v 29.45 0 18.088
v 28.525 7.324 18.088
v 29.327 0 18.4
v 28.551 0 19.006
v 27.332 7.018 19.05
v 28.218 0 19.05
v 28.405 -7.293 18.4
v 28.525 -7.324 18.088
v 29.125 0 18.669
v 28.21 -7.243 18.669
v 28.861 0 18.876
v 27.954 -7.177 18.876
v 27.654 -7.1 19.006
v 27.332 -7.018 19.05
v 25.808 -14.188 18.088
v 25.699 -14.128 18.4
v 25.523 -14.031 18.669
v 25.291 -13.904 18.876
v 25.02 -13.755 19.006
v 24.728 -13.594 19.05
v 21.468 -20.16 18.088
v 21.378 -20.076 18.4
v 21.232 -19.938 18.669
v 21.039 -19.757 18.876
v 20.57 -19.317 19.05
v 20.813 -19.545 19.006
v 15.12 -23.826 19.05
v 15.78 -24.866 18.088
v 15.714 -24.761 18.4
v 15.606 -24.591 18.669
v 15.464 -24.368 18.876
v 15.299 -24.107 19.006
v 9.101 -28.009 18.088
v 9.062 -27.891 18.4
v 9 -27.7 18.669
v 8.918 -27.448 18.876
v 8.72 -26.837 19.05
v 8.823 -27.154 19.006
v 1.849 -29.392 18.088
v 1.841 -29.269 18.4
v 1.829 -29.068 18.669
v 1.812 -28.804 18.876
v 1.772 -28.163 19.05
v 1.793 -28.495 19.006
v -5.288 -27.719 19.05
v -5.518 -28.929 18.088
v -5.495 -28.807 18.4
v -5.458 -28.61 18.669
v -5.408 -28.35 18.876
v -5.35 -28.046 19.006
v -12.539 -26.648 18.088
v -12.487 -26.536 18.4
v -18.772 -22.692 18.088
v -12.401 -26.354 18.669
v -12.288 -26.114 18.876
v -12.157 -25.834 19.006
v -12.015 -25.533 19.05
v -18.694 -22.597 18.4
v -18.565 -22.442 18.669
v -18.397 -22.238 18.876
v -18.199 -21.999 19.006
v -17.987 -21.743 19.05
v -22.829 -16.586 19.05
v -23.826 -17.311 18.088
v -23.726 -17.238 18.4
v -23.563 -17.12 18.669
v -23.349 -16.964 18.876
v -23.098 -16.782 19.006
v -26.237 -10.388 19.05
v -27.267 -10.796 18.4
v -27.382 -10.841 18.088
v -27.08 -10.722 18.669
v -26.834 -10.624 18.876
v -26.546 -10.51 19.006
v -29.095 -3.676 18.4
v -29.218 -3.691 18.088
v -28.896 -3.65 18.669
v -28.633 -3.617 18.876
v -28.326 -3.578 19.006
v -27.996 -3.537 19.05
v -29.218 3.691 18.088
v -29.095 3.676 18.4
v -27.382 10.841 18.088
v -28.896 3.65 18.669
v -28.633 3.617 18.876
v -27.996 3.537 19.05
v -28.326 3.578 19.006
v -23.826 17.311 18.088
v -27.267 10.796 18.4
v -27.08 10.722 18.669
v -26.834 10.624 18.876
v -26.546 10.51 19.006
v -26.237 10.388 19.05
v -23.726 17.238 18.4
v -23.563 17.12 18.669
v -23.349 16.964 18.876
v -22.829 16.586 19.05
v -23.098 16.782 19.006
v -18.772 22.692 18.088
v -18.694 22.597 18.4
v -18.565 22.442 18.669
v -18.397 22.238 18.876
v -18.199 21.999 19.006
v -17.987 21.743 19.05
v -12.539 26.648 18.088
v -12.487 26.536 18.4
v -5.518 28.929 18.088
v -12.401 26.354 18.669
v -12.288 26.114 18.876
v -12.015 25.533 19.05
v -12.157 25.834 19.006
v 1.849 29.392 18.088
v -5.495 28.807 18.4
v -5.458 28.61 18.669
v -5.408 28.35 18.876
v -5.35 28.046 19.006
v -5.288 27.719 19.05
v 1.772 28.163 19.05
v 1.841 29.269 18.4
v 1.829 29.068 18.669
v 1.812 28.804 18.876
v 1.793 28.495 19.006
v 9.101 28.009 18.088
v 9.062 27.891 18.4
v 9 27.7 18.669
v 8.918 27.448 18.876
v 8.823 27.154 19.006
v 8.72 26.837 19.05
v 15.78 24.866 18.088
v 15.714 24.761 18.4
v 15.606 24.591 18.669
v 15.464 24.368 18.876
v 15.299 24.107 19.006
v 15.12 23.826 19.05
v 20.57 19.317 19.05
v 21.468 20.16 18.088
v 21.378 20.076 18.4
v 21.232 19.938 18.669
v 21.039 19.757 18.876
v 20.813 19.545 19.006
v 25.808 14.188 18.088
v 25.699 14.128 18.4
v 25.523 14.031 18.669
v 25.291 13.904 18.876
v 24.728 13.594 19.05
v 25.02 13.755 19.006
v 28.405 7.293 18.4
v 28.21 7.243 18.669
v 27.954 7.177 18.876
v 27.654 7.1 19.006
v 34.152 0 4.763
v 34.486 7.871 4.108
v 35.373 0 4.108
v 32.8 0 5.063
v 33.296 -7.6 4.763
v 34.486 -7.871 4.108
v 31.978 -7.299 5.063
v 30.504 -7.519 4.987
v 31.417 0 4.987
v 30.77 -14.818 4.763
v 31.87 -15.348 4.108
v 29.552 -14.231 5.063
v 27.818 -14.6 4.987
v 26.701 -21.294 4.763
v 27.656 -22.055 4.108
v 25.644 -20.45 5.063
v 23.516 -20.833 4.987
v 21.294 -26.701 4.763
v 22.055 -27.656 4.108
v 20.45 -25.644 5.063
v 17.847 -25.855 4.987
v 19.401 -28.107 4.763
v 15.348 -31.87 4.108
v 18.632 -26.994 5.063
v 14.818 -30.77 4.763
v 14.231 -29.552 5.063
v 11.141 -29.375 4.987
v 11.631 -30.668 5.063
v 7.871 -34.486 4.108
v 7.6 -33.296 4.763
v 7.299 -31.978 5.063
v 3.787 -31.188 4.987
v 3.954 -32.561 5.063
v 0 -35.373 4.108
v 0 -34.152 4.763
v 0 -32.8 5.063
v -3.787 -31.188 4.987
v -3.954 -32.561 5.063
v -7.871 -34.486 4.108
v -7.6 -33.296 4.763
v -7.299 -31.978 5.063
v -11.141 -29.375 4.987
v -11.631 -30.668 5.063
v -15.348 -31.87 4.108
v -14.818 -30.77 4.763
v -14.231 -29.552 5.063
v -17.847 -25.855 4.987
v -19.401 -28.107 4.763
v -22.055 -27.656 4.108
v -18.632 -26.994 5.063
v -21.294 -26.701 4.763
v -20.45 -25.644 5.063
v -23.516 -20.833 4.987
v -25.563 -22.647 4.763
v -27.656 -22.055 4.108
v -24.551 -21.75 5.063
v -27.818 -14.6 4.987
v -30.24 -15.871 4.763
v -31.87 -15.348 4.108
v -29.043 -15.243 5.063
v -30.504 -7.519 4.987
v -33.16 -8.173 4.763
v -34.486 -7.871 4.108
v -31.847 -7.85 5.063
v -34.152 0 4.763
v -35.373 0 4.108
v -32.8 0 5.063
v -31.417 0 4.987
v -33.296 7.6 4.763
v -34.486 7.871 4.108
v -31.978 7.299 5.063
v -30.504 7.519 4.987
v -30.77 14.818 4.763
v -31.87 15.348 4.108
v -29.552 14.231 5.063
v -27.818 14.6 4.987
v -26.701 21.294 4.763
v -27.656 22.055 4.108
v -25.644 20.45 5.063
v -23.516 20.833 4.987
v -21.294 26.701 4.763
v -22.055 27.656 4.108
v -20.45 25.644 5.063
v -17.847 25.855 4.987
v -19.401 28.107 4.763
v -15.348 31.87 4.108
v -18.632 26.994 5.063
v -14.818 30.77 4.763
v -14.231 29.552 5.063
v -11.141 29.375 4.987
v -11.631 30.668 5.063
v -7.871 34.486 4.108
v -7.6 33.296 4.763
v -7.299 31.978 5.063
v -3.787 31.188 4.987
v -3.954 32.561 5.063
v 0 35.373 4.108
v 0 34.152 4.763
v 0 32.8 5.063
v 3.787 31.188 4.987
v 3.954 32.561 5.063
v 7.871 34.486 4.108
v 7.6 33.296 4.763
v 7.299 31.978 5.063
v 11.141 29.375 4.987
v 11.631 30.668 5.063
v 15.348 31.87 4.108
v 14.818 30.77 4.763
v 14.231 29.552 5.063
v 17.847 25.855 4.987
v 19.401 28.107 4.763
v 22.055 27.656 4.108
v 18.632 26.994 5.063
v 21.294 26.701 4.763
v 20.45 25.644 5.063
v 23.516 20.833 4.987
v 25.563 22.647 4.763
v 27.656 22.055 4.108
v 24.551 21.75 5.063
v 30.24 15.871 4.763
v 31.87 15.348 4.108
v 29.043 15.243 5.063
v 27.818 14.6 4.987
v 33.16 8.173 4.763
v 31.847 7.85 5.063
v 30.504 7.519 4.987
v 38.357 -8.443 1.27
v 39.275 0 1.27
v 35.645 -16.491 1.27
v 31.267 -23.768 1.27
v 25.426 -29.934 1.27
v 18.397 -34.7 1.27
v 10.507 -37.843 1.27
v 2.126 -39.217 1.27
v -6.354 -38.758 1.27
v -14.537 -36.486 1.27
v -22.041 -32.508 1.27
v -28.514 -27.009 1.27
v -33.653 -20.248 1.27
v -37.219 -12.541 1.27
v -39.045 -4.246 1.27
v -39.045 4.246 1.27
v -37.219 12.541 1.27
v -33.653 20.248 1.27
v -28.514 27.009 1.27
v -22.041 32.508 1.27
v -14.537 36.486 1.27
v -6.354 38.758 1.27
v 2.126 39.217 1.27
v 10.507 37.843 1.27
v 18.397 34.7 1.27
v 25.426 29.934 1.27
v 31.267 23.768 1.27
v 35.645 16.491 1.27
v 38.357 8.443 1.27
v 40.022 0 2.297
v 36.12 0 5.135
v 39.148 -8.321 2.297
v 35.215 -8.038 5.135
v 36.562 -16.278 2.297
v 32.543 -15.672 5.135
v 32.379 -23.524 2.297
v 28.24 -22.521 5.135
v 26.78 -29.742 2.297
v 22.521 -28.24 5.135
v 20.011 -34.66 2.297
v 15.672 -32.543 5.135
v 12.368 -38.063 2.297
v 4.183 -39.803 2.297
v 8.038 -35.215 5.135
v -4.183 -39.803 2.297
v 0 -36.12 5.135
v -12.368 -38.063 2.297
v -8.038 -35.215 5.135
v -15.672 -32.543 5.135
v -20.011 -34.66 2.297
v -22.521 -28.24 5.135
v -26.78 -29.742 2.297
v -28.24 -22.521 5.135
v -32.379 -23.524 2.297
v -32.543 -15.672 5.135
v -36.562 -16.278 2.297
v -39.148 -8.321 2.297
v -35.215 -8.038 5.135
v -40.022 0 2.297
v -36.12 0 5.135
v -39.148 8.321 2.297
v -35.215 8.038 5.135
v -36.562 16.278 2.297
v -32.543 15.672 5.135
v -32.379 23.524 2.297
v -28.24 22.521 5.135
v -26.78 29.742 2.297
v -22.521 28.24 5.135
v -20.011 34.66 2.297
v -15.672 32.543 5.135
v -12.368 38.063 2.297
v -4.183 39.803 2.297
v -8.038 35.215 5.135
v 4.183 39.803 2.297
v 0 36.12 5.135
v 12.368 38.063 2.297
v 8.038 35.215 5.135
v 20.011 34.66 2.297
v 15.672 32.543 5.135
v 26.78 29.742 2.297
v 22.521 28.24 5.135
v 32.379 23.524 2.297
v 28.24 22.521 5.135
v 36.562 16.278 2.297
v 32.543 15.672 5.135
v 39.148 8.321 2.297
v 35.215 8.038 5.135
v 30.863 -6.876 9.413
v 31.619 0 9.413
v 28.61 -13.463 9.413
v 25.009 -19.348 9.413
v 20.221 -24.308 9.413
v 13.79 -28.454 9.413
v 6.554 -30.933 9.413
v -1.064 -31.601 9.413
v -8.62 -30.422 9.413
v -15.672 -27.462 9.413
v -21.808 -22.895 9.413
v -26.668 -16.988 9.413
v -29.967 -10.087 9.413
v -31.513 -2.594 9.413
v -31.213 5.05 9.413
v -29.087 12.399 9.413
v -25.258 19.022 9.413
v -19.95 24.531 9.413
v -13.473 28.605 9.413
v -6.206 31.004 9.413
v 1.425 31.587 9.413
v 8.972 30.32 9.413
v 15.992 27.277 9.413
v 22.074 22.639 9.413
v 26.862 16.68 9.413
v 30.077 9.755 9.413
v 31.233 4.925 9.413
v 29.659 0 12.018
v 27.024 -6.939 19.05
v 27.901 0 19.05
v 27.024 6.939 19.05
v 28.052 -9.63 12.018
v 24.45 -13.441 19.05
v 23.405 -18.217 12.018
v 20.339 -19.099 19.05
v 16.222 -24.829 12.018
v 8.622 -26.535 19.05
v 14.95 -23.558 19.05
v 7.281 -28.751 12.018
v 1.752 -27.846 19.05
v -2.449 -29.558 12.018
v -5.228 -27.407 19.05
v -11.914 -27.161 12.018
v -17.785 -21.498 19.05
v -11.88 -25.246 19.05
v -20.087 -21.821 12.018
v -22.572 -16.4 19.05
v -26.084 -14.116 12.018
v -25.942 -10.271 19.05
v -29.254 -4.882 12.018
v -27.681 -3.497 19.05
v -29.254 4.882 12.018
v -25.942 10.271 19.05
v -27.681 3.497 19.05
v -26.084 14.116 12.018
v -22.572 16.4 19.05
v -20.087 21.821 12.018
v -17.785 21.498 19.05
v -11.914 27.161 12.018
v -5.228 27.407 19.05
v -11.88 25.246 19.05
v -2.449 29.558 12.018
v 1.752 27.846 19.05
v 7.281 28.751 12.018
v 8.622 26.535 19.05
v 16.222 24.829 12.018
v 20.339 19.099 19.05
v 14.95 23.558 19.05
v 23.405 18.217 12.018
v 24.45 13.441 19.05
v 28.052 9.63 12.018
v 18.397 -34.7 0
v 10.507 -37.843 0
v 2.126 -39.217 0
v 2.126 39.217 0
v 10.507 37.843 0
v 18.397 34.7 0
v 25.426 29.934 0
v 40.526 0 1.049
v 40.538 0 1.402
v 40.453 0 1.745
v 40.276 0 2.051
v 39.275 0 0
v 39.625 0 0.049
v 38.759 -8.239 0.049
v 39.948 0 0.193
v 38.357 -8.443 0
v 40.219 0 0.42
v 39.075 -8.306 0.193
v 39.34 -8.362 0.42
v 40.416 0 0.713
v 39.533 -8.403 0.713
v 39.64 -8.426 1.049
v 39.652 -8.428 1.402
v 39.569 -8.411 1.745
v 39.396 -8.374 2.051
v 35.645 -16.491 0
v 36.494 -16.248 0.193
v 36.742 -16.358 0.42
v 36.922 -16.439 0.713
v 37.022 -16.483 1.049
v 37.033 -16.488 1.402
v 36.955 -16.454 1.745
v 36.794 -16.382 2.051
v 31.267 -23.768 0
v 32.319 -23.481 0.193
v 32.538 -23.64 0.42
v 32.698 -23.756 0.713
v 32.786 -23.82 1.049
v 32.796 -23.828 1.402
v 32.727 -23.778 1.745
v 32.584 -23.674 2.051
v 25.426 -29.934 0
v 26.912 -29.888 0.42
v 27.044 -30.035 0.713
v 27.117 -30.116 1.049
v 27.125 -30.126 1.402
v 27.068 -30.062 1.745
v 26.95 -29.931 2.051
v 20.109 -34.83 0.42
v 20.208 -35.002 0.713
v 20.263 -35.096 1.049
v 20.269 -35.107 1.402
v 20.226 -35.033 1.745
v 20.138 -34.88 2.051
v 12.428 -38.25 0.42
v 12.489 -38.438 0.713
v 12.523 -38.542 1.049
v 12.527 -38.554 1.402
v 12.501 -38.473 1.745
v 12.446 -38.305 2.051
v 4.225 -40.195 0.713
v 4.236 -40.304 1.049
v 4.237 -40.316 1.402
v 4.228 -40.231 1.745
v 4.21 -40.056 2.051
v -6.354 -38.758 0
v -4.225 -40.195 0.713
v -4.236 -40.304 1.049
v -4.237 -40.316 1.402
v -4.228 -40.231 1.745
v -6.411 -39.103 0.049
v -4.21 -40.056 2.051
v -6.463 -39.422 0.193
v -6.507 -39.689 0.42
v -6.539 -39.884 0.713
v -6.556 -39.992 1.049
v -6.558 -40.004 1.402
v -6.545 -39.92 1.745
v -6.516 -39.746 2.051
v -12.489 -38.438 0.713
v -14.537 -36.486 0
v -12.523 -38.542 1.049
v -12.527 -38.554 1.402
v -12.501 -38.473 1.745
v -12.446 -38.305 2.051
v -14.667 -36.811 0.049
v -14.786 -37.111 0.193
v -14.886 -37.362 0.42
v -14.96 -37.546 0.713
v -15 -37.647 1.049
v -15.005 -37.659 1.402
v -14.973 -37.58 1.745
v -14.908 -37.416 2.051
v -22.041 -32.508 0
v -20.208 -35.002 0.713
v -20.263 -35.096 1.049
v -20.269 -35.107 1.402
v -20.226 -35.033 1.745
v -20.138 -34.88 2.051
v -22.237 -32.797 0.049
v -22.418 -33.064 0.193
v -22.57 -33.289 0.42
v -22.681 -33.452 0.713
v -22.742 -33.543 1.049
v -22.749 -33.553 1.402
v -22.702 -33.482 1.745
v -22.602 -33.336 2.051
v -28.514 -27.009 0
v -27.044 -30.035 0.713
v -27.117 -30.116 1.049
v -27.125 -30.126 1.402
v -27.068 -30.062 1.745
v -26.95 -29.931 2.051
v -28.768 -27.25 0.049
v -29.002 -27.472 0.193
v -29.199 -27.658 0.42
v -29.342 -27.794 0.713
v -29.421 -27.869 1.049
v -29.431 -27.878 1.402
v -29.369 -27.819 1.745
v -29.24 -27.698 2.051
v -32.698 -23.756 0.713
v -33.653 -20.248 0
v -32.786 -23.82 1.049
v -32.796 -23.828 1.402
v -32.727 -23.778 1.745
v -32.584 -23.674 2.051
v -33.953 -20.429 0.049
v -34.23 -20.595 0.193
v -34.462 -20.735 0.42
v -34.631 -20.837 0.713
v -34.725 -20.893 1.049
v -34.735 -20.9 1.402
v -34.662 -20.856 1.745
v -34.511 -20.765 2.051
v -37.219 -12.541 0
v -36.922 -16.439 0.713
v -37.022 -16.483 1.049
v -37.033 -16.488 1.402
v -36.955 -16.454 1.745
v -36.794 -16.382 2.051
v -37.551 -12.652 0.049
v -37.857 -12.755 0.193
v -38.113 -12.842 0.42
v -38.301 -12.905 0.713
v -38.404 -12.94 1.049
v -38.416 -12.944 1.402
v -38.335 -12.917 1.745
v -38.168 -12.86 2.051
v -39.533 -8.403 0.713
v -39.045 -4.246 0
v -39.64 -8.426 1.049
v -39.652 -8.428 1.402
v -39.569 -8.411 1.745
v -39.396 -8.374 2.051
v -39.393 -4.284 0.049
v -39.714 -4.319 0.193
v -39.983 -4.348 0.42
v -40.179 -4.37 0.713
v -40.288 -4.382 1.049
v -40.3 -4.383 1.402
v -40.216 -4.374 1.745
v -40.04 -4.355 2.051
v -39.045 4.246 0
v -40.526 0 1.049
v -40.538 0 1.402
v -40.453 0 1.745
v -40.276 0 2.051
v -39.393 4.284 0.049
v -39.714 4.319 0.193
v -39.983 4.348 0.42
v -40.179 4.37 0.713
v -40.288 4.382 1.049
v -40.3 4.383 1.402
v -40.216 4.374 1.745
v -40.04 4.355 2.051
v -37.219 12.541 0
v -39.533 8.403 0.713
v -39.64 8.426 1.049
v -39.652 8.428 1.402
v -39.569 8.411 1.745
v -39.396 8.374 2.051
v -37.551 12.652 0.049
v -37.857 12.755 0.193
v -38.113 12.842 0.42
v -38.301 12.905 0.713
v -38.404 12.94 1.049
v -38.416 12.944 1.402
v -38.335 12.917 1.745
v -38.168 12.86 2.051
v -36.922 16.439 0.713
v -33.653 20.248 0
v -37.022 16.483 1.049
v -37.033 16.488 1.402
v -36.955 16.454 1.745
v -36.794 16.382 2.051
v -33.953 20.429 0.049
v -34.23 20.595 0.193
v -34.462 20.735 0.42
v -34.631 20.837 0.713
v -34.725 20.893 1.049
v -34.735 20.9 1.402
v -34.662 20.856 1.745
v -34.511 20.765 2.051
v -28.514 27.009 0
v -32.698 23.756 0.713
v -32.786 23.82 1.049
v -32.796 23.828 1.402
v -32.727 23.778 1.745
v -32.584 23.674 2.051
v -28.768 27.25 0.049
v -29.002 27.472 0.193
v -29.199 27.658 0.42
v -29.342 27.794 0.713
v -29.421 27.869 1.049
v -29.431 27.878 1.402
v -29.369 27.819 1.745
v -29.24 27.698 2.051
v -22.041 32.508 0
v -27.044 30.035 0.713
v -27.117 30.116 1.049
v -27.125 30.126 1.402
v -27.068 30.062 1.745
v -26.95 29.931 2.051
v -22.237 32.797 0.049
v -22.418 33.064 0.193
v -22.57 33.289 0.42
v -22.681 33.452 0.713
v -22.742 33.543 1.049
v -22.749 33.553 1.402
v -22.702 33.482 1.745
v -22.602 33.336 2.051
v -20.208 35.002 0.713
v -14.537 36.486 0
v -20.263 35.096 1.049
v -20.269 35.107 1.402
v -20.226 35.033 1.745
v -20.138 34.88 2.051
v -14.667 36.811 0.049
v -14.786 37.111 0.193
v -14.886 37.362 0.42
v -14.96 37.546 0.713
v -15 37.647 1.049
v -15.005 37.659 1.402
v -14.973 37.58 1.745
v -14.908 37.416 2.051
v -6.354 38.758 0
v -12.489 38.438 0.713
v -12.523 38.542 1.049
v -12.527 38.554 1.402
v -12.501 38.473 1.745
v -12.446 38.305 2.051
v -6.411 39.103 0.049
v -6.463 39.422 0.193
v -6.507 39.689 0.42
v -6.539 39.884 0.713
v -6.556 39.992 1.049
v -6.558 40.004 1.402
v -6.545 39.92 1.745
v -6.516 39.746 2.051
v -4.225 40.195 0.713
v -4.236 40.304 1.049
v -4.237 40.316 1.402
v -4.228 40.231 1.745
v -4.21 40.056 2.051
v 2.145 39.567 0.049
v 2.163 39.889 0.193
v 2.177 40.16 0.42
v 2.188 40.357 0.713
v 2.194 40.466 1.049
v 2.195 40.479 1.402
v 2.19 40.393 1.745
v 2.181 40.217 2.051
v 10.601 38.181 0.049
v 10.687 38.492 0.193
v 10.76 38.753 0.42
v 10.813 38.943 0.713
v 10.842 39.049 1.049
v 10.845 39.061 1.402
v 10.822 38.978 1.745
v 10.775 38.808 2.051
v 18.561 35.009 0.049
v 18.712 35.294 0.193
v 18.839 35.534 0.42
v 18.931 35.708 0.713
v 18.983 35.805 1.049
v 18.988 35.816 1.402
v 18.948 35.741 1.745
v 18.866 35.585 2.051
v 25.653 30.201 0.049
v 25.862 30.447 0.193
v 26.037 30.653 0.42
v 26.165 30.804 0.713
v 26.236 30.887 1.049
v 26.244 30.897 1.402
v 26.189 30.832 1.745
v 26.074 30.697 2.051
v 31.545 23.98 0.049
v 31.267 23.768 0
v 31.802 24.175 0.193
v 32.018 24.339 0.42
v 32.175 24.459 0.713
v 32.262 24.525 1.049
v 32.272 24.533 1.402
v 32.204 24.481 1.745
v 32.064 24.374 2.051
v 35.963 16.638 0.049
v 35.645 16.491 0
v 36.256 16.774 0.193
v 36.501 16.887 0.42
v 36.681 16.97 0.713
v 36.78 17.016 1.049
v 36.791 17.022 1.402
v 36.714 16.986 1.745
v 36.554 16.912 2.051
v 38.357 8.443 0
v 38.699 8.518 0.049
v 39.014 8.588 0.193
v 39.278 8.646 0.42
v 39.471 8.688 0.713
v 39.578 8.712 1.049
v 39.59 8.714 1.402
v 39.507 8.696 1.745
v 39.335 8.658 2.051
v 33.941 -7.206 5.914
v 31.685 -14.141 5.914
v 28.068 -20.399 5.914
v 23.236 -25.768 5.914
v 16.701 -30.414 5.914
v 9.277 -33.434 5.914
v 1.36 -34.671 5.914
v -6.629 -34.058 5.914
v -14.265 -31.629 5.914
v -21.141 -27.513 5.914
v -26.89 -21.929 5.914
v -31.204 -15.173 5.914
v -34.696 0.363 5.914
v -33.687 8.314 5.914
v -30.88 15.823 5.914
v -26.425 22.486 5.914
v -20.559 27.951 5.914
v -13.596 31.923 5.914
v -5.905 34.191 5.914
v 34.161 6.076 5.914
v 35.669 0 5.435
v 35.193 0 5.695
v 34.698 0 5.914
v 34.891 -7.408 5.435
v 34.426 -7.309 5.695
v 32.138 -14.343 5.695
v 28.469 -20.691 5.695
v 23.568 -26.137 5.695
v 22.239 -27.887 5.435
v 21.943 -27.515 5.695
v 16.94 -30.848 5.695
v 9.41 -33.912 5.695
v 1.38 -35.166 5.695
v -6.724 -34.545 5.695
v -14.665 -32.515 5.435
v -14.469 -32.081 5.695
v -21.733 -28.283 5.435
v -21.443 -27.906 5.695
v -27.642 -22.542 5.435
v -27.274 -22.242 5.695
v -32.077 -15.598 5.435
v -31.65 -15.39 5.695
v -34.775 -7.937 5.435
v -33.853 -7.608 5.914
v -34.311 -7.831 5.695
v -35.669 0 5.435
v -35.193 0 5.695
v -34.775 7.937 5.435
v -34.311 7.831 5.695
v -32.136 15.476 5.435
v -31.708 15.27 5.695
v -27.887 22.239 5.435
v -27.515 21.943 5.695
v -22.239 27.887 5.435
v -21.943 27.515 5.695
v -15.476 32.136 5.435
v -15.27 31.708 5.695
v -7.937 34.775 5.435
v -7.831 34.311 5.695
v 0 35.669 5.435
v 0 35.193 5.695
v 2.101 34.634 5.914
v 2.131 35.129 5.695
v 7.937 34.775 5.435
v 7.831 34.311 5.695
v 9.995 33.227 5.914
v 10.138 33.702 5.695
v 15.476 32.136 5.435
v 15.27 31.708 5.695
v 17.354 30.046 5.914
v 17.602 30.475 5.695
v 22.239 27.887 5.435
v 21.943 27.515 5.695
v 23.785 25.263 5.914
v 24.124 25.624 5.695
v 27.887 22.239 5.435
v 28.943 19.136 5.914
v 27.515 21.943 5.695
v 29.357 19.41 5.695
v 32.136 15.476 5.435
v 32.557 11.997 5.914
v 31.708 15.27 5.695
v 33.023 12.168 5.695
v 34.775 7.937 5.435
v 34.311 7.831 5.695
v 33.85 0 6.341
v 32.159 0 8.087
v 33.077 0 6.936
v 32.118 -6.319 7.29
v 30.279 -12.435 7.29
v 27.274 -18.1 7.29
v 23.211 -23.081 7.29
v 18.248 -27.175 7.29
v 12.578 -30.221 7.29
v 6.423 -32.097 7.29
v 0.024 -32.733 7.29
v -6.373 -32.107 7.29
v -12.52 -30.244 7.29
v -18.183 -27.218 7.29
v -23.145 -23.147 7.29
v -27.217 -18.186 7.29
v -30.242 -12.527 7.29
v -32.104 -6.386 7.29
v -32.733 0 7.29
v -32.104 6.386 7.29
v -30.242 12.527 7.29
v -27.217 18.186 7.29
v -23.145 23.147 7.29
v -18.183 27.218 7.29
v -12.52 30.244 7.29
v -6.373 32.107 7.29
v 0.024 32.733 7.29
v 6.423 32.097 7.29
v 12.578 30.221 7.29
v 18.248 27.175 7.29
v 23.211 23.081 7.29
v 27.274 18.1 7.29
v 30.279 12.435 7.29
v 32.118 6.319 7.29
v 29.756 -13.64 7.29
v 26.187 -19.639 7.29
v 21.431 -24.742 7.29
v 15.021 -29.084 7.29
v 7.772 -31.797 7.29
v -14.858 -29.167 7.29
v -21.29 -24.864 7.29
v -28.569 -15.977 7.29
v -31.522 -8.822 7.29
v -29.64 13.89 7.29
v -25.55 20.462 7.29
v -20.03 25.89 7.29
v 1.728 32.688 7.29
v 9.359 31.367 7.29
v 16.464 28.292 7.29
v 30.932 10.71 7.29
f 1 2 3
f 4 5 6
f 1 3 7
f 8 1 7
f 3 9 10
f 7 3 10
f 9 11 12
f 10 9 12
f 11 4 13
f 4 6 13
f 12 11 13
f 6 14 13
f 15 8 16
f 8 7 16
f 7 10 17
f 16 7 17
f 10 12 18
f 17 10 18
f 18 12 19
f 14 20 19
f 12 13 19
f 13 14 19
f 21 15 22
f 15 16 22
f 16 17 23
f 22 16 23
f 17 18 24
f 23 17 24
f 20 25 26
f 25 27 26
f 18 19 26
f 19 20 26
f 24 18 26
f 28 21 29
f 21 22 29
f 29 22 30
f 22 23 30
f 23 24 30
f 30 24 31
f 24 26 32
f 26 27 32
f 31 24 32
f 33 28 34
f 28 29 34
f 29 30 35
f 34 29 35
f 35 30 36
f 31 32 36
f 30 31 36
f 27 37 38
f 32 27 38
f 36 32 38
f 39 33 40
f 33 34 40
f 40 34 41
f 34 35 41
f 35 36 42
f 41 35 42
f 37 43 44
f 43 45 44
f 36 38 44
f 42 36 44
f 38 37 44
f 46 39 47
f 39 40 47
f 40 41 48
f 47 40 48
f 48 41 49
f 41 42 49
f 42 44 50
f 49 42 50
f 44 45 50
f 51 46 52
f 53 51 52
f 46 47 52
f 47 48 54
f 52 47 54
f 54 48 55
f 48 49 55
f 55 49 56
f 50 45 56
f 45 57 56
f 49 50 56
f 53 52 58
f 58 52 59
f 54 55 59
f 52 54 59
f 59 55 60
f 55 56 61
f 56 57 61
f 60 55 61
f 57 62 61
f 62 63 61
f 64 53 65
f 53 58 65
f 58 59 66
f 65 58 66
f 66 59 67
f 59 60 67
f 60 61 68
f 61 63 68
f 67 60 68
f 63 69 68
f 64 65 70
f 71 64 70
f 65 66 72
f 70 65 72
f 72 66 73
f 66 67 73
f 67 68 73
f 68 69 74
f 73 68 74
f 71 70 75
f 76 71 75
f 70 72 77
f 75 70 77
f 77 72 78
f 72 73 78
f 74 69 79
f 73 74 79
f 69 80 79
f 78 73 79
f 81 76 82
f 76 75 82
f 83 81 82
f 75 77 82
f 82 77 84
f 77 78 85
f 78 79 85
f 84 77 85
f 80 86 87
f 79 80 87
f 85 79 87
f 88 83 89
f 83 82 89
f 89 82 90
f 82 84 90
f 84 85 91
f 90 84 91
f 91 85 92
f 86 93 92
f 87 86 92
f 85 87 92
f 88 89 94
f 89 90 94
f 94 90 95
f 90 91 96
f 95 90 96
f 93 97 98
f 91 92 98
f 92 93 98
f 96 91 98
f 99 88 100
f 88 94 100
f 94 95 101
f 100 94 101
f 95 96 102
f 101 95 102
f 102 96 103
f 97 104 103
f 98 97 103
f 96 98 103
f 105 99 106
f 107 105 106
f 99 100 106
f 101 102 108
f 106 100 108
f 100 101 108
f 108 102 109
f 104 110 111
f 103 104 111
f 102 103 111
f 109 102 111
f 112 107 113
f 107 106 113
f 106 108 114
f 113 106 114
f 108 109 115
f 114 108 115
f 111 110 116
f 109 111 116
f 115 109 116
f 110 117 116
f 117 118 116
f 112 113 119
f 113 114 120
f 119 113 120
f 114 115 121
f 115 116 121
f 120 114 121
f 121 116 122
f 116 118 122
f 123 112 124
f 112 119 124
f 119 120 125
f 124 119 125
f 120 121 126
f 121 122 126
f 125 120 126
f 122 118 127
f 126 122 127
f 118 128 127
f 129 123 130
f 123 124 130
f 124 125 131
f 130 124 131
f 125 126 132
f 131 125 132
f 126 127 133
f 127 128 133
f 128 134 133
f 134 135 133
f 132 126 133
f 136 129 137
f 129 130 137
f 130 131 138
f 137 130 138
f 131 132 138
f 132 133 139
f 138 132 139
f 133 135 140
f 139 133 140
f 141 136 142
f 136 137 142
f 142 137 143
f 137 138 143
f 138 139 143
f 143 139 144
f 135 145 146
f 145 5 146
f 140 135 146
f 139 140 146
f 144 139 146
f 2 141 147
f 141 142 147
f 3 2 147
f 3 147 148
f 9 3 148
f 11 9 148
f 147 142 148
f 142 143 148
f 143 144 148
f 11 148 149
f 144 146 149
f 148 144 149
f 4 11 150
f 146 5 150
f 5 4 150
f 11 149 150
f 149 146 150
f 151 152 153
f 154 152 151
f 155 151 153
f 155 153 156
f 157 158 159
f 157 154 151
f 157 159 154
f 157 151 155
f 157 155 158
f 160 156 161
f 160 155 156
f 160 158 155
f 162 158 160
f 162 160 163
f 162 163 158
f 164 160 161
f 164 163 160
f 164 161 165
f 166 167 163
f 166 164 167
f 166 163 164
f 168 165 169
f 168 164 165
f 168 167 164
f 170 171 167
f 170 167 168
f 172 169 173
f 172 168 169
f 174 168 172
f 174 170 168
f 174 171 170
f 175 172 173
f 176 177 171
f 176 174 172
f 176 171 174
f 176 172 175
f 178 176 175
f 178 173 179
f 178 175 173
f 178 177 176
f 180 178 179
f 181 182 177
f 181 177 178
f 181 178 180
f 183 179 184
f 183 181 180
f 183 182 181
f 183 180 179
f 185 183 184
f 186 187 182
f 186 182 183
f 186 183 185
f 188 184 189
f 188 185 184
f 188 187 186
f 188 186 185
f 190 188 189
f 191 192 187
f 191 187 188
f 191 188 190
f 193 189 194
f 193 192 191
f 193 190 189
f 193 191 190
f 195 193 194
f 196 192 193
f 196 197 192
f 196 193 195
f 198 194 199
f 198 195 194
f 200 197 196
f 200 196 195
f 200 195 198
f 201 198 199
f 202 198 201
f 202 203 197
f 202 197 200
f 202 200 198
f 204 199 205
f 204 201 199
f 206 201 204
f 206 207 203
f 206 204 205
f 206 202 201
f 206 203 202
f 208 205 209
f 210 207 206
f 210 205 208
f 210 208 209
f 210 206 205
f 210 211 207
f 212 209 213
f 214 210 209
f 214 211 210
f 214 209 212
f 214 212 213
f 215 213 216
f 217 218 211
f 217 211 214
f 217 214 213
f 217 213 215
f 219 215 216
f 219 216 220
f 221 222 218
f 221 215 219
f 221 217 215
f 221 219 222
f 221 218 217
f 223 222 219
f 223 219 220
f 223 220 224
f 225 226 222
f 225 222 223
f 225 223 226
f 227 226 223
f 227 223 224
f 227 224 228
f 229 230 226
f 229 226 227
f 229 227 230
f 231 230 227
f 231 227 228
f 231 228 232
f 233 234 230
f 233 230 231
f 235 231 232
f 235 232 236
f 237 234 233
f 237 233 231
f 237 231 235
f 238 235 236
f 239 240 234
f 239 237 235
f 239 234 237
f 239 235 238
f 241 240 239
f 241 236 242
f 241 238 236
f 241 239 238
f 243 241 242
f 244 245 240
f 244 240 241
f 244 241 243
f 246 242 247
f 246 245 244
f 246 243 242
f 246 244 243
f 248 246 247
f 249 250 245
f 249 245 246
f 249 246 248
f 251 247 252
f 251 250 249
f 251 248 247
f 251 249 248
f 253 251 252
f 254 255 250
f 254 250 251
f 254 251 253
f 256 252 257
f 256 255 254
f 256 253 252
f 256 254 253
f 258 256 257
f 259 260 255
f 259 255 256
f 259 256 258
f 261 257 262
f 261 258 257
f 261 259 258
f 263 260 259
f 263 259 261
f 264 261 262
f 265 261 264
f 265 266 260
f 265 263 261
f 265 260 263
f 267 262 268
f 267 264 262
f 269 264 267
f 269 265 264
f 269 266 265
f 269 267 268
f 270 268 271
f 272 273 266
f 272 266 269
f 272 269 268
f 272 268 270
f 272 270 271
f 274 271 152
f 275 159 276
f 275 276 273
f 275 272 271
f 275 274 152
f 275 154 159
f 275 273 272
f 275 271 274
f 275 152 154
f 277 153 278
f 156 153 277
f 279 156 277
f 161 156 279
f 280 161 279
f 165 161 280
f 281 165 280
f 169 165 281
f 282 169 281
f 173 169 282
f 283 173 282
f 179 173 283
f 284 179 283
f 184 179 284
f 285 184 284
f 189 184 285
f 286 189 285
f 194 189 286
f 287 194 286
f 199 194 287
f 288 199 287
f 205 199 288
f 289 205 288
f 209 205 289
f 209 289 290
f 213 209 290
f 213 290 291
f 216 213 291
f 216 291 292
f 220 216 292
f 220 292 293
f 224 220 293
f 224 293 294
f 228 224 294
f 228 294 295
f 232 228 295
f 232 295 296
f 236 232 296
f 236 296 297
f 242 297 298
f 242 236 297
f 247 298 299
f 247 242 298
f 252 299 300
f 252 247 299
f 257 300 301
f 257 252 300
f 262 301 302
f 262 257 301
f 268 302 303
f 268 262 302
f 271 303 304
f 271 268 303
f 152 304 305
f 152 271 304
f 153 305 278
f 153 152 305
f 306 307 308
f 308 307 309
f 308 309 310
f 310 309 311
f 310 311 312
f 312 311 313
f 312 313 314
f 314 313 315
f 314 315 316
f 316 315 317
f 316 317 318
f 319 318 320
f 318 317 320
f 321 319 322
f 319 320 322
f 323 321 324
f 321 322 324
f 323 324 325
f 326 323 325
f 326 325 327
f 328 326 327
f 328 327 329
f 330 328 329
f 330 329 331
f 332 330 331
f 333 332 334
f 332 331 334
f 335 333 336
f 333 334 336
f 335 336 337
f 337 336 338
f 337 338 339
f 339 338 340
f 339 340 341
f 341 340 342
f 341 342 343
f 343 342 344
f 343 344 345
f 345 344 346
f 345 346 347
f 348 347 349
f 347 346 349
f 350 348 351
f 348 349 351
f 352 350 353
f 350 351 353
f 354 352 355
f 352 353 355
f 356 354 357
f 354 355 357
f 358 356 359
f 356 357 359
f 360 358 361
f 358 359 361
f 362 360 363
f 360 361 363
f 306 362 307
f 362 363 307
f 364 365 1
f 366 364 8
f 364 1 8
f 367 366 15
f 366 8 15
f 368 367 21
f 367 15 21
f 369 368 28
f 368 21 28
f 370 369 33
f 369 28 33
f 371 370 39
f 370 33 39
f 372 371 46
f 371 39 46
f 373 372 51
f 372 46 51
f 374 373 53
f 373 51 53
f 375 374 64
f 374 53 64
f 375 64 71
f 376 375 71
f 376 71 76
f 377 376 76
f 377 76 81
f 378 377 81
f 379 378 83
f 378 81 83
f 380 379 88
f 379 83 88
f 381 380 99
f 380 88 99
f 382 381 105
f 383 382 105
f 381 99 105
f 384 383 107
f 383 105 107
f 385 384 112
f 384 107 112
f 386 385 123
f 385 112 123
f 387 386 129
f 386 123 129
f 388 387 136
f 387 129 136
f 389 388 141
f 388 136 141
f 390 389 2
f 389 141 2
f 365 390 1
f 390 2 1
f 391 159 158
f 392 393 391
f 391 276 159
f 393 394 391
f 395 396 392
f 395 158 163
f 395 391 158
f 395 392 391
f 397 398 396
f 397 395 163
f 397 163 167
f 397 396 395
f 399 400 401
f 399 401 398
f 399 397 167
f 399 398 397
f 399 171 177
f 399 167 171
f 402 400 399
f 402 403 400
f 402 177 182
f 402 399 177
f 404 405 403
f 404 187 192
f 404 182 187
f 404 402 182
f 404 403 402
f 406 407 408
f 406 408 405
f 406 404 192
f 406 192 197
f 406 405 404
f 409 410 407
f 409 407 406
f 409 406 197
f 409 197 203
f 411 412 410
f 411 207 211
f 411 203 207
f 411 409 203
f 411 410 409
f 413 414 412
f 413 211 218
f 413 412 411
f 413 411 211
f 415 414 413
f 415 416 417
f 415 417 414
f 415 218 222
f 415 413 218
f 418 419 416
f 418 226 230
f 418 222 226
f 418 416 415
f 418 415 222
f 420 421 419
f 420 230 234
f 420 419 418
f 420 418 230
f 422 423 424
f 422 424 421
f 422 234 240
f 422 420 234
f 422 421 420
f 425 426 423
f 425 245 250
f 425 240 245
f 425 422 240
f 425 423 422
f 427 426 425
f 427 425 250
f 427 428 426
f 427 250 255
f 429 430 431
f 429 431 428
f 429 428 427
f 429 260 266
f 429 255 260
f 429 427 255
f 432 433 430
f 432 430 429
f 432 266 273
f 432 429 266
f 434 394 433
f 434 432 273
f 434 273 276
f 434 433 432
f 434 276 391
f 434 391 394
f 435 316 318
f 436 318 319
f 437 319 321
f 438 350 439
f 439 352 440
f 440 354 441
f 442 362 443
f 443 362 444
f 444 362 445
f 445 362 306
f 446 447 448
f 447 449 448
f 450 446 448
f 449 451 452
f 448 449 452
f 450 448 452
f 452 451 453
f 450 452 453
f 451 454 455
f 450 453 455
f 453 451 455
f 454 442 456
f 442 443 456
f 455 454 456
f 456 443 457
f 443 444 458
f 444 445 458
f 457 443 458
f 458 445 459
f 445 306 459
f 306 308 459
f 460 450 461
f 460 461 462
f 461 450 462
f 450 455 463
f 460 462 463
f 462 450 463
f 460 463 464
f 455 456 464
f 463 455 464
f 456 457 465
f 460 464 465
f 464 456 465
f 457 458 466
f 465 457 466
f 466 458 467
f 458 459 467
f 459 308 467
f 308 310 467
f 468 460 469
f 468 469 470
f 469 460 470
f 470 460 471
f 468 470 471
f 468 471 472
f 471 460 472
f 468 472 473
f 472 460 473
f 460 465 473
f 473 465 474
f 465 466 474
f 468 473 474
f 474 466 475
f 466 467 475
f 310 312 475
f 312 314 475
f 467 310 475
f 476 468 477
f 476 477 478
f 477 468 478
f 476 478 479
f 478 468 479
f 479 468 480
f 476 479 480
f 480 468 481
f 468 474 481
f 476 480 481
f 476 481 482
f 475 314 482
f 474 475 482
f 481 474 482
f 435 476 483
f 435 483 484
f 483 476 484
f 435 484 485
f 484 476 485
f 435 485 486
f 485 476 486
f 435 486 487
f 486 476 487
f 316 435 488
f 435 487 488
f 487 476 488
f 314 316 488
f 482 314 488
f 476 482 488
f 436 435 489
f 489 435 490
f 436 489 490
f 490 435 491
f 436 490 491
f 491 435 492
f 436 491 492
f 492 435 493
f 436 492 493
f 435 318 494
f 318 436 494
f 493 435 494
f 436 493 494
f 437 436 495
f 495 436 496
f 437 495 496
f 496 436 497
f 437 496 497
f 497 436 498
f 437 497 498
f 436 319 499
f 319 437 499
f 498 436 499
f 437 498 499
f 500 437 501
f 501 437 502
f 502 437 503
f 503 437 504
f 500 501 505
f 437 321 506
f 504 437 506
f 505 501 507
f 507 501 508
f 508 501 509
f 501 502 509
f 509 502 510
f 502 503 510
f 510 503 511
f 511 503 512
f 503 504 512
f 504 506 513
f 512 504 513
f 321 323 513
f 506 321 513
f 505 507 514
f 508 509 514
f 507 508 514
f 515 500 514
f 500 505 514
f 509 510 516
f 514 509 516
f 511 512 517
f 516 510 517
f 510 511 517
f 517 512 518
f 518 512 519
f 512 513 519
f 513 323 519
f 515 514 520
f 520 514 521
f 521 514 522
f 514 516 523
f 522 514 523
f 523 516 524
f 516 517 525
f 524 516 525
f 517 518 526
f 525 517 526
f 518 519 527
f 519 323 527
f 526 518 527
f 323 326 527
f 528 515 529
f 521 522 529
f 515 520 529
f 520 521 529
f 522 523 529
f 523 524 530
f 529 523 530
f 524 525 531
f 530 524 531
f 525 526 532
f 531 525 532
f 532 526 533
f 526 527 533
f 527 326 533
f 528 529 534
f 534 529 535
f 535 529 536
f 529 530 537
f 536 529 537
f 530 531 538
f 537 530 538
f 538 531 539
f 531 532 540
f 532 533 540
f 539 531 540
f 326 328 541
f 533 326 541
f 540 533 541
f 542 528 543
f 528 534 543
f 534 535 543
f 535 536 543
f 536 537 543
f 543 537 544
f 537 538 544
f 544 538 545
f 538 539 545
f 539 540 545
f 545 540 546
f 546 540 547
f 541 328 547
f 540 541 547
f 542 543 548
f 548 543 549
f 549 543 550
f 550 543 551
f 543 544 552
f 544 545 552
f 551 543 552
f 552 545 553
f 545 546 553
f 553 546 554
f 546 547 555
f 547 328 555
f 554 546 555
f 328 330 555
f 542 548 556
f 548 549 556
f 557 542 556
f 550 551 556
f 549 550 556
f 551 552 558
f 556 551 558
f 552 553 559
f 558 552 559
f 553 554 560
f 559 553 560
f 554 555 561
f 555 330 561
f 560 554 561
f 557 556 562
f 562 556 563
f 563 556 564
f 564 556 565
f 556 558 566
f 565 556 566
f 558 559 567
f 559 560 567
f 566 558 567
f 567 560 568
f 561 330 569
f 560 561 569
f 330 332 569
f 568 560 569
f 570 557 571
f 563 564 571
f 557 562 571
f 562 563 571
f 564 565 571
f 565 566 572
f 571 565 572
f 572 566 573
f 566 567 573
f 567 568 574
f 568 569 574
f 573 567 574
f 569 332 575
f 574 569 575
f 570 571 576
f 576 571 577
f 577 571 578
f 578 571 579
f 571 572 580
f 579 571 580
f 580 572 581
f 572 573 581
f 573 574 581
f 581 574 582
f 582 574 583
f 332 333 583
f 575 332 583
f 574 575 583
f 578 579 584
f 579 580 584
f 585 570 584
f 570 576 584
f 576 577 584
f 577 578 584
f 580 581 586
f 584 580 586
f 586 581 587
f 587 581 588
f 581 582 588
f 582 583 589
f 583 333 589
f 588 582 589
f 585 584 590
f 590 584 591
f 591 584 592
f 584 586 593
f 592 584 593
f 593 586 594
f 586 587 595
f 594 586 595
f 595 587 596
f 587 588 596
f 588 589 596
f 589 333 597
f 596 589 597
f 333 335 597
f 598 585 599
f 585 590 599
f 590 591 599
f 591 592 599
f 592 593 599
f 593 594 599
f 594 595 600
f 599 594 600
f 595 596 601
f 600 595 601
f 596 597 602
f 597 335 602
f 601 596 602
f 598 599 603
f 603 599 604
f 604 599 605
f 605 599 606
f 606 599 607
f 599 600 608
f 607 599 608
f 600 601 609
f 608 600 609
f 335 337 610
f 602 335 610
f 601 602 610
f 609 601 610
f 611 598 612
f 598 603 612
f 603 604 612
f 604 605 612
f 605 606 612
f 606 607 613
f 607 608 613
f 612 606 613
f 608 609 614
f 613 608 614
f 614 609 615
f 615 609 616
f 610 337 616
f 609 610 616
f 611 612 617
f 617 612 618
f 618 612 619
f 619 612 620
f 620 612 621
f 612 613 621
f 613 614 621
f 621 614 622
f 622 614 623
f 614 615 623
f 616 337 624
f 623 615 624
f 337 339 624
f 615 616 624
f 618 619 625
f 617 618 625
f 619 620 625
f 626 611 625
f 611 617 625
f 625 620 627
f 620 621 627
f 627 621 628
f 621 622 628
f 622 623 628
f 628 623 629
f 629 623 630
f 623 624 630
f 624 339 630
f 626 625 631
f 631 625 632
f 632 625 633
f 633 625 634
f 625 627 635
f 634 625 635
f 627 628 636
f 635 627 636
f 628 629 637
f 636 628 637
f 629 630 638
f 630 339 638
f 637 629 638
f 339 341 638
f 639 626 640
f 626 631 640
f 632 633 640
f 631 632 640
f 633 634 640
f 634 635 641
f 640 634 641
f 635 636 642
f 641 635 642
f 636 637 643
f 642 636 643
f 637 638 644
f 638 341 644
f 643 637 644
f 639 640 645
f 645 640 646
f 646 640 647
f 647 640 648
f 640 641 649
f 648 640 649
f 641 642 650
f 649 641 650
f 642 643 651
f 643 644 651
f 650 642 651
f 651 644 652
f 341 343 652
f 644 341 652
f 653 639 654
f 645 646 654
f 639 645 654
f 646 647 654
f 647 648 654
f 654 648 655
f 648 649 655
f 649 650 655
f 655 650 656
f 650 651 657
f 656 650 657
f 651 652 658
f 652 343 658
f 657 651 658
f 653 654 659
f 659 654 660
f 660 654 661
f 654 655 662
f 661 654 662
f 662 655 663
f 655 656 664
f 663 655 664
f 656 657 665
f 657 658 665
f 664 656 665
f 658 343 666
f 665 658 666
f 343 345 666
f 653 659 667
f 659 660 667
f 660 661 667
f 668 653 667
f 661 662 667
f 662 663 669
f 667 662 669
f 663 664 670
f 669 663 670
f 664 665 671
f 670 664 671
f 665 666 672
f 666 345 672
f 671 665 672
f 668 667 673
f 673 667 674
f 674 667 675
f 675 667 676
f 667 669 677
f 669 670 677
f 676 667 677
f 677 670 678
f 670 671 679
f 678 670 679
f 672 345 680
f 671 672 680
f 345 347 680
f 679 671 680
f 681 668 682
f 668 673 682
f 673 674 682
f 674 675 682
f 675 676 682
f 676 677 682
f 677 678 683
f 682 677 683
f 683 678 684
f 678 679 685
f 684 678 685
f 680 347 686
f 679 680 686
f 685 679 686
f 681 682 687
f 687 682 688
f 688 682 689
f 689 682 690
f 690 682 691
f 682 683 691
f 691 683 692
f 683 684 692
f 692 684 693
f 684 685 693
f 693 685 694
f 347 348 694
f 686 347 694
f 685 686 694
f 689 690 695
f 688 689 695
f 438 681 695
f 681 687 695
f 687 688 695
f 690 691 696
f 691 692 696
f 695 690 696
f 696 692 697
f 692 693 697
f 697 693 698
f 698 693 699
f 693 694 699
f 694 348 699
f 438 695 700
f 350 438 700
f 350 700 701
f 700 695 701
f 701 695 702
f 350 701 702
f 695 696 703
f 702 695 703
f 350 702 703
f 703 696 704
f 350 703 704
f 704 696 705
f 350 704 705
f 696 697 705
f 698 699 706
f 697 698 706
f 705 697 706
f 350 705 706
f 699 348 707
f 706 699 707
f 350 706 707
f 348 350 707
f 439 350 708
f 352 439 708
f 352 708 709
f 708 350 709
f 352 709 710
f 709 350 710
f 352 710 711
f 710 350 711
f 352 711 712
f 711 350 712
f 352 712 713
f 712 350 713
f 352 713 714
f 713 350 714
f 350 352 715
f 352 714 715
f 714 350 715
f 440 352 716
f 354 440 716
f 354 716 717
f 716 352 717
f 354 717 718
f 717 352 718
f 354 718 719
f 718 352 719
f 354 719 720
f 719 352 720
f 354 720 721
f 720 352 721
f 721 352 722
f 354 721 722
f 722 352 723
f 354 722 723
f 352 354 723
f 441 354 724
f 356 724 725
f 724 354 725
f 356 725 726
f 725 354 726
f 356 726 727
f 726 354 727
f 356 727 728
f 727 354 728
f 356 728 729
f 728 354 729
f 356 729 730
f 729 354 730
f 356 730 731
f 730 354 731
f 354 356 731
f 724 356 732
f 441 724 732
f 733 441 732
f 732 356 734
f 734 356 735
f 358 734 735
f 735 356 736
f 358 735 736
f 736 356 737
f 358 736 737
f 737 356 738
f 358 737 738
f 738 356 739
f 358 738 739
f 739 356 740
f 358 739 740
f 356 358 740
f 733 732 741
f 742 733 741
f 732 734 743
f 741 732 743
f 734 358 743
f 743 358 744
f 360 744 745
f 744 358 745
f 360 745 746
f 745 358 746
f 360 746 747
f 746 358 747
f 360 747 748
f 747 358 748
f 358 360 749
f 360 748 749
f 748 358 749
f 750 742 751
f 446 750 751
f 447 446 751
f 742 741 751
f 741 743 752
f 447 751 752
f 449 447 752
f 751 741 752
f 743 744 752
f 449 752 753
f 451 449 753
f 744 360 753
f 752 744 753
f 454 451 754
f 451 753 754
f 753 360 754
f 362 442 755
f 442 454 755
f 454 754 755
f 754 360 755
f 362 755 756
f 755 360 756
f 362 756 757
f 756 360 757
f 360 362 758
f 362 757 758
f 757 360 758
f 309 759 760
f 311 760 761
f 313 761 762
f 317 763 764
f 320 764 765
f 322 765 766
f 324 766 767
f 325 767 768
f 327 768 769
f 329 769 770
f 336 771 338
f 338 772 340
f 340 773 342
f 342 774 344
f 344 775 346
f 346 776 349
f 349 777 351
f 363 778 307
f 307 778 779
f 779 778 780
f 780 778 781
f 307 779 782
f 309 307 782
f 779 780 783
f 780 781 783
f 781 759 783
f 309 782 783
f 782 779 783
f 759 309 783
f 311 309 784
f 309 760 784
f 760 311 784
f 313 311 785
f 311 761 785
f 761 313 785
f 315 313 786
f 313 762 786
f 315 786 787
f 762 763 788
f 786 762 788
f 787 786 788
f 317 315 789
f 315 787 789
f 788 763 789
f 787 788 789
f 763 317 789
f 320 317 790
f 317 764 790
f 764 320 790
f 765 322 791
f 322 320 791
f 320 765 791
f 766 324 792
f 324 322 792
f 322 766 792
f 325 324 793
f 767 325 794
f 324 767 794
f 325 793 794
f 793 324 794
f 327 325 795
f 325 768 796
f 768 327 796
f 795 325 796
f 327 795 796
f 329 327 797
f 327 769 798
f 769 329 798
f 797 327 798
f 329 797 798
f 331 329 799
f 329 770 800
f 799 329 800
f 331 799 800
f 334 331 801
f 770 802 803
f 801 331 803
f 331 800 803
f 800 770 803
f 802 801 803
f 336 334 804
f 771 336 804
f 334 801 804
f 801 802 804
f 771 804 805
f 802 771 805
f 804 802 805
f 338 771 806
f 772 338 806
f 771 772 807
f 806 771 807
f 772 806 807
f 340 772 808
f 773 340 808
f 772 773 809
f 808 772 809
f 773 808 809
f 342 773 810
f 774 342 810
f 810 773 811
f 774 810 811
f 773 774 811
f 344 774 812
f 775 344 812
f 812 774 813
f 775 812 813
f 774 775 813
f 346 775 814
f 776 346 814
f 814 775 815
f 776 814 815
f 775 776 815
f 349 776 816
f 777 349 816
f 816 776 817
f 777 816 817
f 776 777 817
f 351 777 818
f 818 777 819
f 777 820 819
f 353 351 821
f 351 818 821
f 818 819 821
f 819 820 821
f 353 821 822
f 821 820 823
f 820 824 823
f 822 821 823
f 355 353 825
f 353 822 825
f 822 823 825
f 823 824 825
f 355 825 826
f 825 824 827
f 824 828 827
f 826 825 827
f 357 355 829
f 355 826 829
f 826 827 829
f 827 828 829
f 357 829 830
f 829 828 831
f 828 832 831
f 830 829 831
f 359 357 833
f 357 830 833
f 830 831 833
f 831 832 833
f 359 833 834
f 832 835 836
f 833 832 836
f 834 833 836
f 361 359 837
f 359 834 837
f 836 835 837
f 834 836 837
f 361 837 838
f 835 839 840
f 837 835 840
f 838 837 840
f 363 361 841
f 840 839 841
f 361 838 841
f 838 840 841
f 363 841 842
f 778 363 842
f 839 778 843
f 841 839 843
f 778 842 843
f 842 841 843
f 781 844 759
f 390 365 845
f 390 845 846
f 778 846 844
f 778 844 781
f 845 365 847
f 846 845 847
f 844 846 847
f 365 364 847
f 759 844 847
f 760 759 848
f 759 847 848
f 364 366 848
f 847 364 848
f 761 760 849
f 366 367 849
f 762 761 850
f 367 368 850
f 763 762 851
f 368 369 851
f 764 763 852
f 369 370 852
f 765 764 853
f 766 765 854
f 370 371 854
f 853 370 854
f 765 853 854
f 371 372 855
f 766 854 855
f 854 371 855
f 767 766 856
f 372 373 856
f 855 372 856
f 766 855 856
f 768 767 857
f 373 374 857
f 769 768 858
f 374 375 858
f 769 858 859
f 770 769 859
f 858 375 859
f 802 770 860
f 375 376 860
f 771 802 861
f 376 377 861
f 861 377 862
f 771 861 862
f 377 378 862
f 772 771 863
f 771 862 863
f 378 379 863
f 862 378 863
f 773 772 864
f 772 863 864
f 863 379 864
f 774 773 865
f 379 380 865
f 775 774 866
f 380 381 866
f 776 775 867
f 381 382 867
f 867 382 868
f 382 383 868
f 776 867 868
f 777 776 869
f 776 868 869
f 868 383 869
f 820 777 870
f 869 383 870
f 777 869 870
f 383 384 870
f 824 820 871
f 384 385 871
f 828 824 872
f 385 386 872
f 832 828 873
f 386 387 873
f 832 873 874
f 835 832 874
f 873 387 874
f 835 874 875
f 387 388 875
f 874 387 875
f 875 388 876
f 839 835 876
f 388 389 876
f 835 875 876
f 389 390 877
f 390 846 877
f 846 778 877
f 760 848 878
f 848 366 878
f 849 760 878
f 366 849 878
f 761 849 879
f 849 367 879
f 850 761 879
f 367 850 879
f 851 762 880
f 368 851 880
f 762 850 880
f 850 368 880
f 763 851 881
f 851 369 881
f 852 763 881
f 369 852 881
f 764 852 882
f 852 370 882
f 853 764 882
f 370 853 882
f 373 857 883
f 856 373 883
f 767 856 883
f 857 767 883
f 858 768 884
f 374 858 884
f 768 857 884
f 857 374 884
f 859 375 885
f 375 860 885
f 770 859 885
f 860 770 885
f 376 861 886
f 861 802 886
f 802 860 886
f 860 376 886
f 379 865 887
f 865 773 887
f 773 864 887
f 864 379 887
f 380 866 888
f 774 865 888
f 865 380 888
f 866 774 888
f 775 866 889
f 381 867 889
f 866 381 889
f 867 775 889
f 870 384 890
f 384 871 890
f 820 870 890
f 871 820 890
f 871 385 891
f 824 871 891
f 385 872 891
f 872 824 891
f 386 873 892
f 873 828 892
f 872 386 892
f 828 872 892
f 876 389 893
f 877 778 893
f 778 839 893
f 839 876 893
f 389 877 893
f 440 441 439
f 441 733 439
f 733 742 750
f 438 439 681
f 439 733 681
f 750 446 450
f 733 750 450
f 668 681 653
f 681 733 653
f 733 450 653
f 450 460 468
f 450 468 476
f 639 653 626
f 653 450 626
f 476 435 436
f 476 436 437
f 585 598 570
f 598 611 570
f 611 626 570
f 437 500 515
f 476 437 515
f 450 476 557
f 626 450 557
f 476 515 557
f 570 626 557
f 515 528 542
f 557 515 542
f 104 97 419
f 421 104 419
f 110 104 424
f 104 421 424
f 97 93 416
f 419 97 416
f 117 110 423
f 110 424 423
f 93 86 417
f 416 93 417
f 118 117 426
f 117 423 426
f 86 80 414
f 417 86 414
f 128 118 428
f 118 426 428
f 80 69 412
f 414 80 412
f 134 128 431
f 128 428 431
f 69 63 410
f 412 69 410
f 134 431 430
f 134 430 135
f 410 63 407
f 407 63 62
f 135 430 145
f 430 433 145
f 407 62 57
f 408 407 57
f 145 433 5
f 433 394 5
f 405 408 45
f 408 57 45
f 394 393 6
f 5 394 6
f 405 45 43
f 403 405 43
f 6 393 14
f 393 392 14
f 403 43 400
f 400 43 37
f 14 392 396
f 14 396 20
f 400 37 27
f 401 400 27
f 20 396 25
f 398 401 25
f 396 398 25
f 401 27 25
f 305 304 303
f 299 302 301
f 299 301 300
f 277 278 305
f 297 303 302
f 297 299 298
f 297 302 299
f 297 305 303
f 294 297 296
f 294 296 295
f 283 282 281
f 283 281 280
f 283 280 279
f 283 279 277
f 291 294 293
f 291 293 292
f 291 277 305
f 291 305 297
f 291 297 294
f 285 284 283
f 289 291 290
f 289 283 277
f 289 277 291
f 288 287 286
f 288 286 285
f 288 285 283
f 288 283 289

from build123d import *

# Parameters (mm, degrees)
F2_T = -1.27
F3_R = 1.27
F4_R = 1.27
F5_R = 5.08


with BuildPart() as f1:
    # F0 (on Front) → F1 (revolve)
    with BuildSketch(Plane.XZ):
        with BuildLine():
            Line((0, 19.05), (0, 0))
            Line((0, 0), (43.18, 0))
            Line((43.18, 0), (36.1202941176, 5.1351804111))
            ThreePointArc((36.1202941176, 5.1351804111), (34.3489379305, 6.0386627498), (32.385, 6.35))
            Line((32.385, 6.35), (29.21, 19.05))
            Line((29.21, 19.05), (0, 19.05))
        make_face()
    revolve(axis=Axis((0, 0, 9.525), (0, 0, -1)))

    # F2
    f2_openings = [f1.faces().sort_by_distance(p)[0] for p in [
        (0, 0, 19.05),
    ]]
    offset(amount=F2_T, openings=f2_openings, kind=Kind.INTERSECTION)

    # F3
    f3_edges = [f1.edges().sort_by_distance(p)[0] for p in [
        (-43.18, 0, 0),
    ]]
    fillet(f3_edges, radius=F3_R)

    # F4
    f4_edges = [f1.edges().sort_by_distance(p)[0] for p in [
        (-29.21, 0, 19.05),
    ]]
    fillet(f4_edges, radius=F4_R)

    # F5
    f5_edges = [f1.edges().sort_by_distance(p)[0] for p in [
        (-32.385, 0, 6.35),
    ]]
    fillet(f5_edges, radius=F5_R)


solid = f1.part
